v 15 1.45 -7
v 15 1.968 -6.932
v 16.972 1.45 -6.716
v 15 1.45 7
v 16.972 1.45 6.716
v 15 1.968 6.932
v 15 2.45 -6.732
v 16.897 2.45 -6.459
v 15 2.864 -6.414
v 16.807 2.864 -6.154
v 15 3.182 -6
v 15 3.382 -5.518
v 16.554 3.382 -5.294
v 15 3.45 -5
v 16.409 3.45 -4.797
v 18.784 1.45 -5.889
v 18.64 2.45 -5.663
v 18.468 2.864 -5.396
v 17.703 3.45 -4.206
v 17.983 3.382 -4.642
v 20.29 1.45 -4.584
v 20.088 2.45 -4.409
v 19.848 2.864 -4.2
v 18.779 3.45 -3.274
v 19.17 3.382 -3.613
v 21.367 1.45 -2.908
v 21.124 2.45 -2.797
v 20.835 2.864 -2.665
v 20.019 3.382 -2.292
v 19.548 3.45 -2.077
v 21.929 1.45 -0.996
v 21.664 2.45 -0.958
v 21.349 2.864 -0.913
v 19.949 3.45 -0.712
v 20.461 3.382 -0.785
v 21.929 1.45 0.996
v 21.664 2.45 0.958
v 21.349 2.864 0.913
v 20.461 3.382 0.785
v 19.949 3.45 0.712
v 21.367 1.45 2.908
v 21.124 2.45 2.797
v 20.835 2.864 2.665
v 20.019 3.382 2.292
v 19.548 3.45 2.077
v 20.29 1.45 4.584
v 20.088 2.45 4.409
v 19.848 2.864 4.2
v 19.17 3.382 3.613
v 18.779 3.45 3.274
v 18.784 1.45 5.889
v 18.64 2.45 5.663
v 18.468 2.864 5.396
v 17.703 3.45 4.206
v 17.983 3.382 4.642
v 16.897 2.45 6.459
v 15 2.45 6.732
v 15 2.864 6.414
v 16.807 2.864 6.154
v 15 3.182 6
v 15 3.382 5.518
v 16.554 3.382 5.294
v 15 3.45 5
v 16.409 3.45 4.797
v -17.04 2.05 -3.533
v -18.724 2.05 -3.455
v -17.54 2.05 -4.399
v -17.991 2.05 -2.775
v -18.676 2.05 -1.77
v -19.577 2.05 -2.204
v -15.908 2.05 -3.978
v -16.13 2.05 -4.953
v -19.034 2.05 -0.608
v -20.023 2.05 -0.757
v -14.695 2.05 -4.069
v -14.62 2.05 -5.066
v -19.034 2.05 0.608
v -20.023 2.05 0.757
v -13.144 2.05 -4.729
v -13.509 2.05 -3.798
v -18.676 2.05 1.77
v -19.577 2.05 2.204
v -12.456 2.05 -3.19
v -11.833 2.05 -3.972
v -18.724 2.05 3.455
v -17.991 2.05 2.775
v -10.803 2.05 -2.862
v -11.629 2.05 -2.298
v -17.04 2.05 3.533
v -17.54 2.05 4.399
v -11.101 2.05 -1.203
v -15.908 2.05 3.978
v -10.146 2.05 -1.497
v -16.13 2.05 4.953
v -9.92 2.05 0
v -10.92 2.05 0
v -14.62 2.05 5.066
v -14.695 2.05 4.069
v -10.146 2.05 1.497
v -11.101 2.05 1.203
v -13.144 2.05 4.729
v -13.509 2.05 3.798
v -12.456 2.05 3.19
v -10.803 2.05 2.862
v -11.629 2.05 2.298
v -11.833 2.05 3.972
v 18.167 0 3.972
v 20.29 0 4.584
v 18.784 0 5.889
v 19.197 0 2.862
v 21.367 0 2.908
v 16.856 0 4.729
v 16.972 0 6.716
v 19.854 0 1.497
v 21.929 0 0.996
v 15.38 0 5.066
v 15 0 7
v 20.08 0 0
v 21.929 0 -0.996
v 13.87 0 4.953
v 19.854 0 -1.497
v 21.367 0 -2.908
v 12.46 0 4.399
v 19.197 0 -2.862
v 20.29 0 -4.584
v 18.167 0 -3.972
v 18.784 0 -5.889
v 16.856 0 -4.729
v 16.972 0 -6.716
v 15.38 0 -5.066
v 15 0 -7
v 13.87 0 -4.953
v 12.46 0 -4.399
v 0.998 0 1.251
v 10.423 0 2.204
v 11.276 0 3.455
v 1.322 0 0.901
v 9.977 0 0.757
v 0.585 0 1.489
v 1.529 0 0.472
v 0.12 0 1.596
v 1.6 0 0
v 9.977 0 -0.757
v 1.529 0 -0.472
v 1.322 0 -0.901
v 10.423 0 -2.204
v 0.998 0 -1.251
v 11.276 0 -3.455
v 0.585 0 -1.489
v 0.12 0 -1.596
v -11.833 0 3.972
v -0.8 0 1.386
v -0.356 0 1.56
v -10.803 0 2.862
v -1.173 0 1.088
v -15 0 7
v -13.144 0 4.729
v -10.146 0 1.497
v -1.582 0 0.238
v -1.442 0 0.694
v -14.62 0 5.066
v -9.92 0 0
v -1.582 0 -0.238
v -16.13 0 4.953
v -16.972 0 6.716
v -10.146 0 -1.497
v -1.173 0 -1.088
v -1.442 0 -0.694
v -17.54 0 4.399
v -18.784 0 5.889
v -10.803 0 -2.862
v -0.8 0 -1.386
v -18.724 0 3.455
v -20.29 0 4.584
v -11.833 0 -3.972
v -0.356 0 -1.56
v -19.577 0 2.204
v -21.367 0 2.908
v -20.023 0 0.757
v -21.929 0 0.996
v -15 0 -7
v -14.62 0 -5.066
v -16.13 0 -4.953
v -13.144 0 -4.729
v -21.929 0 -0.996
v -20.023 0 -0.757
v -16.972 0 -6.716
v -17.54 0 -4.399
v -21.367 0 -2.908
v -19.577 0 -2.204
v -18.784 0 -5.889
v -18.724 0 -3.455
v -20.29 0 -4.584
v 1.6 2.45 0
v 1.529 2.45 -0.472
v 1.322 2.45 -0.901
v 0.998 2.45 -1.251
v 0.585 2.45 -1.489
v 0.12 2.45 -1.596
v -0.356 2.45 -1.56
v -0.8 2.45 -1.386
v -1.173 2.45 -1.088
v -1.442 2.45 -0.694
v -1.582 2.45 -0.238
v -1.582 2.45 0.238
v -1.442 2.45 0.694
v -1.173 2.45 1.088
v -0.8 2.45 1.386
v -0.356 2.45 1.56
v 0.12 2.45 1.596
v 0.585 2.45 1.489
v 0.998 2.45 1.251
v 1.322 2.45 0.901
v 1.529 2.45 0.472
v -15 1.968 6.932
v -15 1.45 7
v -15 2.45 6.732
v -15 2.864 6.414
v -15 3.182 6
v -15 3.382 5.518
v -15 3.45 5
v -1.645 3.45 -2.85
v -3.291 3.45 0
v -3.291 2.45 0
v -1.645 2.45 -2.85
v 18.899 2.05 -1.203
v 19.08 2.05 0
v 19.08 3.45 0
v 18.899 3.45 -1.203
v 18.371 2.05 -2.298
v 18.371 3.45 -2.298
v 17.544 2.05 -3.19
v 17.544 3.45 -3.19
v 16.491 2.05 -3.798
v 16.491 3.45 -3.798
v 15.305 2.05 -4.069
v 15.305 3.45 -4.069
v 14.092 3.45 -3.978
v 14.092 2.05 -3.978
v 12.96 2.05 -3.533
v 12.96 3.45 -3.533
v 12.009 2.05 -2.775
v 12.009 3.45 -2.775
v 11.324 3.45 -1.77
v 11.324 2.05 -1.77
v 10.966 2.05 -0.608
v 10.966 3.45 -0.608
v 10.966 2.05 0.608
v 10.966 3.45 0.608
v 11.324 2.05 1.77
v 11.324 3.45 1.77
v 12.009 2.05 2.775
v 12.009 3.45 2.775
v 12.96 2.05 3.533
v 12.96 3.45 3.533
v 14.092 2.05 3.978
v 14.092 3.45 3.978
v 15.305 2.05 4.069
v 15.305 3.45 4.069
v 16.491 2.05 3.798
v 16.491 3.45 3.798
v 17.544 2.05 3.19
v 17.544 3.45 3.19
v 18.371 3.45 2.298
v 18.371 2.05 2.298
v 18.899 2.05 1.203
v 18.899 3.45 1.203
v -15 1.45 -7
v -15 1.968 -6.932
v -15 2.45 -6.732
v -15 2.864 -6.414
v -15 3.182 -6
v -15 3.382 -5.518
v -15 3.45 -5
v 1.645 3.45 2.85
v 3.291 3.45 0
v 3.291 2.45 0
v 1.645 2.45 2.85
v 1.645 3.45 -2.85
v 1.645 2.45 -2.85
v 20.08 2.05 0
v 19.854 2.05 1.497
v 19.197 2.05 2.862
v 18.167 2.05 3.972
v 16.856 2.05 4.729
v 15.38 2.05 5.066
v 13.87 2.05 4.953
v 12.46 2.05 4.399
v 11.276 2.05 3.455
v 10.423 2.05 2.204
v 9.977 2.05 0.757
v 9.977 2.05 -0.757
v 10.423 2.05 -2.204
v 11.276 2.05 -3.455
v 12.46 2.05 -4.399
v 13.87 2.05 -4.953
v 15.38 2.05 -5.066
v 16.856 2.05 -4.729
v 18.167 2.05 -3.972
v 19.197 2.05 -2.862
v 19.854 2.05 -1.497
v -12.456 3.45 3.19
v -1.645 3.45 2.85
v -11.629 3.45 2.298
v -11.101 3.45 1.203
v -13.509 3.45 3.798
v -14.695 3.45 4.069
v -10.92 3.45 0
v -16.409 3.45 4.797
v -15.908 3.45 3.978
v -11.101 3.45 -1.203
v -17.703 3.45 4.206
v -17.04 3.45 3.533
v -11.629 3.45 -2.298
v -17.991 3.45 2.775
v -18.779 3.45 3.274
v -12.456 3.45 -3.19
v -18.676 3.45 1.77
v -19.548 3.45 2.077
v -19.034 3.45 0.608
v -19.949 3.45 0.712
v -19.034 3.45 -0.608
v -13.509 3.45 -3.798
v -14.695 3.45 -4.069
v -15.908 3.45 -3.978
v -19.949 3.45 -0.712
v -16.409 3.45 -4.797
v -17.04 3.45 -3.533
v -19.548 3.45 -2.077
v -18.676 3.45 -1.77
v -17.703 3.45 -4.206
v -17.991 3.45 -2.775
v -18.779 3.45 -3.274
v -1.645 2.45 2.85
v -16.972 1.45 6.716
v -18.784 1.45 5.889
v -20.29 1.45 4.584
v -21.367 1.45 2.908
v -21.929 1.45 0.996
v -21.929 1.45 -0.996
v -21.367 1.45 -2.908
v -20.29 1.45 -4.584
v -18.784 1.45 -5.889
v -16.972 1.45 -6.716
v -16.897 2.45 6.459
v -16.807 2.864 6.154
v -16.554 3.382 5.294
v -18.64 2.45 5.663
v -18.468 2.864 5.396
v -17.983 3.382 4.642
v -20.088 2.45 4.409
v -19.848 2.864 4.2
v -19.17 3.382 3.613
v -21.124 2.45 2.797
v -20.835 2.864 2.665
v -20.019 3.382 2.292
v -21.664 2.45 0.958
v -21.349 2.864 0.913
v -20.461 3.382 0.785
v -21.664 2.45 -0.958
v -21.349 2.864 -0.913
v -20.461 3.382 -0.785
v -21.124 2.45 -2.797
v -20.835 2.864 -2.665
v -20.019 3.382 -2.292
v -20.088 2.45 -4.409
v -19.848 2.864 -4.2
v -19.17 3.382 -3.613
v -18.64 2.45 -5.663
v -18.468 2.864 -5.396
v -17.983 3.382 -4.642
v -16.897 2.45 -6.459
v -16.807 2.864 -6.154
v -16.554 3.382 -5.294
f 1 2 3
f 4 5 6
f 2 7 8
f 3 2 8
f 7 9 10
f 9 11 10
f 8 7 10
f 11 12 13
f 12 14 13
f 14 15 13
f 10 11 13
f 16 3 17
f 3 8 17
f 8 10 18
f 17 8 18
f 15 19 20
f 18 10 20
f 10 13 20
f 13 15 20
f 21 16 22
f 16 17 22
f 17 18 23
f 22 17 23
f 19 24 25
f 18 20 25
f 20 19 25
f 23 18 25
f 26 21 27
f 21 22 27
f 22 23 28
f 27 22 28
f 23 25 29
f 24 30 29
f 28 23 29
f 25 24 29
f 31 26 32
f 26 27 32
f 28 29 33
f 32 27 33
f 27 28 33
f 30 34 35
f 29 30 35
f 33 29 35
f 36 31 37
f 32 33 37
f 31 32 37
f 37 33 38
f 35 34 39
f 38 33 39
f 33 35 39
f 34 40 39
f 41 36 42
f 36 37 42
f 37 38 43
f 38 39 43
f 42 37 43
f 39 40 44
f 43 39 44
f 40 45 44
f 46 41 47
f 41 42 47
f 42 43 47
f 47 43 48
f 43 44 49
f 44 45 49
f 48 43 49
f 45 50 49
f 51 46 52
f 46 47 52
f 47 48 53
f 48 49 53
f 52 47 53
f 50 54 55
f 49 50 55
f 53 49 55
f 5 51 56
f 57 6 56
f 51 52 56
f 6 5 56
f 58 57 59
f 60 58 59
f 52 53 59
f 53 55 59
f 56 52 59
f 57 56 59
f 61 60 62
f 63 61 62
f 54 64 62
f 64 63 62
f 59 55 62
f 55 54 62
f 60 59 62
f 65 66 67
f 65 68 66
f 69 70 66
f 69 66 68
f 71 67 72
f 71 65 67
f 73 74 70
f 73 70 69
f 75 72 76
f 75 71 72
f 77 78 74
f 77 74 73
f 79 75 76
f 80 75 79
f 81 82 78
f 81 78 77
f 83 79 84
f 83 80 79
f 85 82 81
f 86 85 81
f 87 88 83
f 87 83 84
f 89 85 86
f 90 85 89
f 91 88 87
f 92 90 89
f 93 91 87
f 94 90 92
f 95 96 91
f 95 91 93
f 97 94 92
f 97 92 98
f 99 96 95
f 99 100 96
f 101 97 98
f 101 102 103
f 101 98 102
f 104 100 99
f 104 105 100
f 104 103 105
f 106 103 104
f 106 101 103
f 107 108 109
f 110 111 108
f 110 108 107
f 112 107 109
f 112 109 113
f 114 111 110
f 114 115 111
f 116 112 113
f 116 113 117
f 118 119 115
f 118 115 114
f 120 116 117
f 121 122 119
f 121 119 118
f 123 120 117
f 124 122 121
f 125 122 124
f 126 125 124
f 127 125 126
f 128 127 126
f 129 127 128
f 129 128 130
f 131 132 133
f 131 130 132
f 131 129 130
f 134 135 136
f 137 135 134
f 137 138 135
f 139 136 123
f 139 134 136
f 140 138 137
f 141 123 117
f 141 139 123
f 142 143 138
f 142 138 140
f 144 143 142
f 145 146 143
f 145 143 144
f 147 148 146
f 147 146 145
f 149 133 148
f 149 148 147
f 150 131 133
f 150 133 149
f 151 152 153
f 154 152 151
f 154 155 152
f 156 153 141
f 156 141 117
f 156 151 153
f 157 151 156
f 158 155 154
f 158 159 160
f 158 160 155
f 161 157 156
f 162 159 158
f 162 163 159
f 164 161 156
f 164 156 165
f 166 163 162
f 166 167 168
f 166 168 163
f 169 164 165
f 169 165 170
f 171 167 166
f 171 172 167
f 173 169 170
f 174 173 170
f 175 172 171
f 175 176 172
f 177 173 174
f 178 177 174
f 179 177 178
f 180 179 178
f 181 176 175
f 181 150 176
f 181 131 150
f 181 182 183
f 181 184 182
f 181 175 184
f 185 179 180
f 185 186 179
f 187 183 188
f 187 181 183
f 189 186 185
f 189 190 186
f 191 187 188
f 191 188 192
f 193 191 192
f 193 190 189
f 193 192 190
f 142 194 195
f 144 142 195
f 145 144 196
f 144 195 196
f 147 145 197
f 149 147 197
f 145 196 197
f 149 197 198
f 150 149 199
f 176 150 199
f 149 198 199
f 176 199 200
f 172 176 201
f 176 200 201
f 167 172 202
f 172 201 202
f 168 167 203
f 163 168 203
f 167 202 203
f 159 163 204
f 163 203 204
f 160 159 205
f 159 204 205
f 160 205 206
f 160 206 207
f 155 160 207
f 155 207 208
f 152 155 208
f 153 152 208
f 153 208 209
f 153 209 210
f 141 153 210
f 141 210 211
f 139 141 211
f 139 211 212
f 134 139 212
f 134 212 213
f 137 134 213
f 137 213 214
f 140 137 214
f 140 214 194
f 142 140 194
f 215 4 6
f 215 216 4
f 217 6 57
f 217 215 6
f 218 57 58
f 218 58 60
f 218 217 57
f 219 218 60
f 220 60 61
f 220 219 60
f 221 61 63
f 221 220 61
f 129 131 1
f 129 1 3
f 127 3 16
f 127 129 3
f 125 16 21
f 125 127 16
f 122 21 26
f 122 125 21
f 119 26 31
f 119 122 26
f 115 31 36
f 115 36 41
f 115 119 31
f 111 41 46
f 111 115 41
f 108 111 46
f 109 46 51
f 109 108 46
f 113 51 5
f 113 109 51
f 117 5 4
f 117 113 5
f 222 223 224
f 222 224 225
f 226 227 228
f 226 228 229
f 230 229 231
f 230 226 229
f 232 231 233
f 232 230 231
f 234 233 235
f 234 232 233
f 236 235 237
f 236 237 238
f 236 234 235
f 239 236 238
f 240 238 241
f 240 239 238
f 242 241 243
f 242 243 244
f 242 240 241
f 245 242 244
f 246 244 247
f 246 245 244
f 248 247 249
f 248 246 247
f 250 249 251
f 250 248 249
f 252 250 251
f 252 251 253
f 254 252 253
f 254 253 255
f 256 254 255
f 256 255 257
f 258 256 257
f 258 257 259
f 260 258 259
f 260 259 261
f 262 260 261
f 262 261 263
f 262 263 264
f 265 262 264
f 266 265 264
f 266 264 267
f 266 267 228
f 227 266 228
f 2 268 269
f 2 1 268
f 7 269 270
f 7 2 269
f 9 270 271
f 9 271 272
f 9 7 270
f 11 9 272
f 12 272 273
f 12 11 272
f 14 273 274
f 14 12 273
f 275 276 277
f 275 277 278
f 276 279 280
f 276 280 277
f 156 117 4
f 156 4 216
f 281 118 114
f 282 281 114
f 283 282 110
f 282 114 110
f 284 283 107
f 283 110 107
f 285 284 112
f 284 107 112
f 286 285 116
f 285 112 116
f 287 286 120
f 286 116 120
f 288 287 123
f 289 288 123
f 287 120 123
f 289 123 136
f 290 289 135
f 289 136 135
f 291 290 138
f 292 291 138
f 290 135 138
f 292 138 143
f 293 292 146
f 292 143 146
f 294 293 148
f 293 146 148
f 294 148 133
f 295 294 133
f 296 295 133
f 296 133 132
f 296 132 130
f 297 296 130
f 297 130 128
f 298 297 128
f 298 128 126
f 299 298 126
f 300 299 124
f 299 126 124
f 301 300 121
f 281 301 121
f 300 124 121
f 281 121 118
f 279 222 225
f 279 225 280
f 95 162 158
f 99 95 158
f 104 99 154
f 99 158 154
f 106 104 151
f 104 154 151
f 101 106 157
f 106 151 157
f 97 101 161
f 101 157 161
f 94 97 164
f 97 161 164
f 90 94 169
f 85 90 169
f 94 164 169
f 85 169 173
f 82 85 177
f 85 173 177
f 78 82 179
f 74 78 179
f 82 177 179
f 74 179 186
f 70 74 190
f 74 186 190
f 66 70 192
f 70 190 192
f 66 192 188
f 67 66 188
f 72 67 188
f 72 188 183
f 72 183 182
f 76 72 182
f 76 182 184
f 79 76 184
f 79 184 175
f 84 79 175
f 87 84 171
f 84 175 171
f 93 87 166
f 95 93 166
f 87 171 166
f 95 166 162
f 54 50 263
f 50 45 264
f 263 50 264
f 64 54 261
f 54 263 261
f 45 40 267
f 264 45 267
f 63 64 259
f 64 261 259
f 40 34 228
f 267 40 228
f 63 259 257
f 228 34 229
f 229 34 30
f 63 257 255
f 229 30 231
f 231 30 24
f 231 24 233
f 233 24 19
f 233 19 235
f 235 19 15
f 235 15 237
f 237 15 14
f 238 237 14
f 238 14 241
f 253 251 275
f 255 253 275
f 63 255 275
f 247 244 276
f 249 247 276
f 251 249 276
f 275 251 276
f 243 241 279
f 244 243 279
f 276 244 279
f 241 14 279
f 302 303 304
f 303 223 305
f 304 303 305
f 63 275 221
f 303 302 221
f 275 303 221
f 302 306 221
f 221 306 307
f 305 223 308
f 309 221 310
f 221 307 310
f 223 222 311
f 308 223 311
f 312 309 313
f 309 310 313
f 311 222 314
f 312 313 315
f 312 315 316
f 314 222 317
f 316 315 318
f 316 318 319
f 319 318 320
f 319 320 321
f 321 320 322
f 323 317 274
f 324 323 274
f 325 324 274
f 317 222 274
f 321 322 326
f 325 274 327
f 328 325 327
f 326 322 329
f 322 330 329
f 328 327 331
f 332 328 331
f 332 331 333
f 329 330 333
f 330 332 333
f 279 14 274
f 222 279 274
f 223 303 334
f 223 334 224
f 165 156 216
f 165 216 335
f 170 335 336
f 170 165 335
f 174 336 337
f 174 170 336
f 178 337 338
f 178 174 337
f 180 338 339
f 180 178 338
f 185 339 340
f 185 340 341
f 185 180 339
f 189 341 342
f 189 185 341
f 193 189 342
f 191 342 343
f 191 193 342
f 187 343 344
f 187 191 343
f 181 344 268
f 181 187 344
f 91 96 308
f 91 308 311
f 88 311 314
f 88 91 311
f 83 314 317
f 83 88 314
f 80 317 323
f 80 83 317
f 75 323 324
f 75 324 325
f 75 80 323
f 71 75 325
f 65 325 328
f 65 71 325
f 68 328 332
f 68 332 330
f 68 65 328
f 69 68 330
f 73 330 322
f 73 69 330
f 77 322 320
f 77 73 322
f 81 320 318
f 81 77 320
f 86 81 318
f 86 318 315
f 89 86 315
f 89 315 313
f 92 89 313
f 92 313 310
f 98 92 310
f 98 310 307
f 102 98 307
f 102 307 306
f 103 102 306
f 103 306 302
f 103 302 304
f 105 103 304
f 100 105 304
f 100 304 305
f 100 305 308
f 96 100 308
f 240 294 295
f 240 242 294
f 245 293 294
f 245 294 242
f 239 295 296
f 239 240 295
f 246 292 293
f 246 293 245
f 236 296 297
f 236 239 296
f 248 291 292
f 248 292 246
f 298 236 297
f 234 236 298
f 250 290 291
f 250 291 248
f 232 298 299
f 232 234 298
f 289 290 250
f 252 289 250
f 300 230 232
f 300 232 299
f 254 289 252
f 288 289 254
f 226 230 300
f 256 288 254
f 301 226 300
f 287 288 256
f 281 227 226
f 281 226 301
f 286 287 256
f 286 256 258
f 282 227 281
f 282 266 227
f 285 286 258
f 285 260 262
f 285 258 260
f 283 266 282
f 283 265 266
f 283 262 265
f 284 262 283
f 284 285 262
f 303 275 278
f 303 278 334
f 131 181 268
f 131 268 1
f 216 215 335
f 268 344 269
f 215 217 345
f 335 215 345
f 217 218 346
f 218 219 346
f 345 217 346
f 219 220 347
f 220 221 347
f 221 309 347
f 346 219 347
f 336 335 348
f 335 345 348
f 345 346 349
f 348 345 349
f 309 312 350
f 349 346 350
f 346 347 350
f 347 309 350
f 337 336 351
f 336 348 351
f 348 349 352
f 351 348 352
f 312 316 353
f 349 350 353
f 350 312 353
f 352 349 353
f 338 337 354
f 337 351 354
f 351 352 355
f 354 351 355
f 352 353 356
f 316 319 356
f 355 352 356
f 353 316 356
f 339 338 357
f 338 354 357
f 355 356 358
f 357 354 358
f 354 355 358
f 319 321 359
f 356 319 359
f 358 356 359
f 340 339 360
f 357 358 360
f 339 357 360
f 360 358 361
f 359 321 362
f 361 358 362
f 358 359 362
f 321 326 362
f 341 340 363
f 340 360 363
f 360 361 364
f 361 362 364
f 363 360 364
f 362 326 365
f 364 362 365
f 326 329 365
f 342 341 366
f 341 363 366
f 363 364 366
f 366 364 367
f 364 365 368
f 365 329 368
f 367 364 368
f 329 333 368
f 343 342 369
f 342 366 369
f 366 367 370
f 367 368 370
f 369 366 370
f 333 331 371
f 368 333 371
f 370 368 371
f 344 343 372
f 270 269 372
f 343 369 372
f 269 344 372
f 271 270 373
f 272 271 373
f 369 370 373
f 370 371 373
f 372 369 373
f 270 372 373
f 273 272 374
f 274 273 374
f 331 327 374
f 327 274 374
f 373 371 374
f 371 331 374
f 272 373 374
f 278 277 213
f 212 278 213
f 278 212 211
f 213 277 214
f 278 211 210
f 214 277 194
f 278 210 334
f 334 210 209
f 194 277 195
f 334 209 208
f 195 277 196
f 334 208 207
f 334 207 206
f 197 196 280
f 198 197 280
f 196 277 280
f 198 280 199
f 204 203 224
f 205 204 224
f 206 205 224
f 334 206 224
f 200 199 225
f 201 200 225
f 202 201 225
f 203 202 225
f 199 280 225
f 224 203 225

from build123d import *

# Parameters (mm, degrees)
SKETCH1_R           = 4.08
BOSS_EXTRUDE1_DEPTH = 3.45
SKETCH2_R           = 1.6
CUT_EXTRUDE1_DEPTH  = 3.45
CUT_EXTRUDE2_DEPTH  = 1
SKETCH4_R           = 5.08
CUT_EXTRUDE3_DEPTH  = 2.05
FILLET1_R           = 2


with BuildPart() as part:
    # Sketch1 → Boss-Extrude1 (new body)
    with BuildSketch(Plane(origin=(0, 0, 0), x_dir=(1, 0, 0), z_dir=(0, 1, 0))):
        with BuildLine():
            Line((-15, 7), (15, 7))
            ThreePointArc((15, 7), (22, 0), (15, -7))
            Line((15, -7), (-15, -7))
            ThreePointArc((-15, -7), (-22, 0), (-15, 7))
        make_face()
        with Locations((-15, 0)):
            Circle(SKETCH1_R, mode=Mode.SUBTRACT)
        with Locations((15, 0)):
            Circle(SKETCH1_R, mode=Mode.SUBTRACT)
    extrude(amount=BOSS_EXTRUDE1_DEPTH)

    # Sketch2 → Cut-Extrude1 (cut)
    with BuildSketch(Plane(origin=(0, 3.45, 0), x_dir=(1, 0, 0), z_dir=(0, 1, 0))):
        Circle(SKETCH2_R)
    extrude(amount=-CUT_EXTRUDE1_DEPTH, mode=Mode.SUBTRACT)

    # Sketch3 → Cut-Extrude2 (cut)
    with BuildSketch(Plane(origin=(0, 3.45, 0), x_dir=(1, 0, 0), z_dir=(0, 1, 0))):
        Polygon((-1.645448267, 2.85), (1.645448267, 2.85), (3.290896534, 0), (1.645448267, -2.85), (-1.645448267, -2.85), (-3.290896534, 0), align=None)
    extrude(amount=-CUT_EXTRUDE2_DEPTH, mode=Mode.SUBTRACT)

    # Sketch4 → Cut-Extrude3 (cut)
    with BuildSketch(Plane.XZ):
        with Locations((-15, 0)):
            Circle(SKETCH4_R)
        with Locations((15, 0)):
            Circle(SKETCH4_R)
    extrude(amount=-CUT_EXTRUDE3_DEPTH, mode=Mode.SUBTRACT)

    # Fillet1
    fillet1_edges = [part.edges().sort_by_distance(p)[0] for p in [
        (22, 3.45, 0),
        (0, 3.45, -7),
        (-22, 3.45, 0),
        (0, 3.45, 7),
    ]]
    fillet(fillet1_edges, radius=FILLET1_R)


solid = part.part
